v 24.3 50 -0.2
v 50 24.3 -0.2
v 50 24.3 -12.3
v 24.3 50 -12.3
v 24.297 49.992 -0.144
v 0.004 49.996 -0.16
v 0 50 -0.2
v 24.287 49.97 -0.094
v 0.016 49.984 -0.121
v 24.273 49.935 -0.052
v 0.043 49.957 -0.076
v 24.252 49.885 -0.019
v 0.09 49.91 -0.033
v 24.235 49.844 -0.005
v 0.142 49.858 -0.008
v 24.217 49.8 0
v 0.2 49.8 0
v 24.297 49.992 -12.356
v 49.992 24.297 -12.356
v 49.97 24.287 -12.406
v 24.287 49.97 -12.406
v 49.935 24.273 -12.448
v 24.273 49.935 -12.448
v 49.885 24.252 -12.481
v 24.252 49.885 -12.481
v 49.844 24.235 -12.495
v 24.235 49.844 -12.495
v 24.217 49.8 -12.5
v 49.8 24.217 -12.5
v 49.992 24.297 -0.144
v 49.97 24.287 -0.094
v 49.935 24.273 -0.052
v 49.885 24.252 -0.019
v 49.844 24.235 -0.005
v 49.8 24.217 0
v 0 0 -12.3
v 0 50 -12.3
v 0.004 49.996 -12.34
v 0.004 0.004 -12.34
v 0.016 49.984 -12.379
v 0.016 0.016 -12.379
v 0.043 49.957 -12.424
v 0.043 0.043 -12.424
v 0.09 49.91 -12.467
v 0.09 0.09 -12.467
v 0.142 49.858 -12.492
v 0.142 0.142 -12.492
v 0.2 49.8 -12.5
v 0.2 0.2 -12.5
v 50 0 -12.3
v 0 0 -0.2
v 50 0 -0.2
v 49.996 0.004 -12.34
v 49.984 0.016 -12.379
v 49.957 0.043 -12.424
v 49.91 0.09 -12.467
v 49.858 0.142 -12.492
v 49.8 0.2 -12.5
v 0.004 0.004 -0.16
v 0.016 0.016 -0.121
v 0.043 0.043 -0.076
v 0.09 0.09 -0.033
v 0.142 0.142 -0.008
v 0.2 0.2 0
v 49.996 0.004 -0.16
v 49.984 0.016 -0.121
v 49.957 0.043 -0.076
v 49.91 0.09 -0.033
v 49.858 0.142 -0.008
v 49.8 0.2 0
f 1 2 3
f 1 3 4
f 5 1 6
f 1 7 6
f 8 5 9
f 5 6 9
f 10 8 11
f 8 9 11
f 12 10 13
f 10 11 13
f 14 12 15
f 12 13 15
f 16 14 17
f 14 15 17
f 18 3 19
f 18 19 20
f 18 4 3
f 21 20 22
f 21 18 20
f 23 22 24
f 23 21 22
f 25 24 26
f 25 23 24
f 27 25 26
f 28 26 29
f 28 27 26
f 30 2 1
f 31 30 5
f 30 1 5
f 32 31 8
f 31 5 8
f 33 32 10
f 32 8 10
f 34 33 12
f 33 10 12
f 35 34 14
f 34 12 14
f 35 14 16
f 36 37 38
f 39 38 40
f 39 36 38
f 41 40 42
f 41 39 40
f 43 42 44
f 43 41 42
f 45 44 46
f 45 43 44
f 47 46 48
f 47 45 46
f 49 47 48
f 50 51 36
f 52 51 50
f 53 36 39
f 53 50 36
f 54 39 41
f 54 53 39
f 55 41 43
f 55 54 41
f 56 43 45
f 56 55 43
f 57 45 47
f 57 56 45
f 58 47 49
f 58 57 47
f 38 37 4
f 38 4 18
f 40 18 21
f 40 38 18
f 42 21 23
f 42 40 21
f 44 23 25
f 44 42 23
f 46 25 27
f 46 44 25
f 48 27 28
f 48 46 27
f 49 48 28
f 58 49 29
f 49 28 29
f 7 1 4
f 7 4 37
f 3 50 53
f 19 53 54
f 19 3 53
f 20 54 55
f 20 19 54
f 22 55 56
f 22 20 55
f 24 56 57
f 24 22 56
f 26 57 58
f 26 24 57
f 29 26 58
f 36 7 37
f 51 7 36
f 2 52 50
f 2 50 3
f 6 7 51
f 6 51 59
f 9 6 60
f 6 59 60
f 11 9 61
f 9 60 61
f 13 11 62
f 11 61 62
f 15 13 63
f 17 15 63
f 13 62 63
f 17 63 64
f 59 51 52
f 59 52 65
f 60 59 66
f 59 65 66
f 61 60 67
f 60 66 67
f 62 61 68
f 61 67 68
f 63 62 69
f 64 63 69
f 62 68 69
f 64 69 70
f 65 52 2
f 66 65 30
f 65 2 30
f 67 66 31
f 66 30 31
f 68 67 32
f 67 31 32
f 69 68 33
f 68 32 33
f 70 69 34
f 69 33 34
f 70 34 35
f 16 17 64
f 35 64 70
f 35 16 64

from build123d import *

# Parameters (mm, degrees)
F1_DEPTH = 12.5
F2_R     = 0.2


with BuildPart() as f1:
    # F0 (on Top) → F1 (new body)
    with BuildSketch(Plane.XY):
        Polygon((0, 50), (0, 0), (50, 0), (50, 24.3), (24.3, 50), align=None)
    extrude(amount=-F1_DEPTH)

    # F2
    f2_edges = [f1.edges().sort_by_distance(p)[0] for p in [
        (12.15, 50, 0),
        (0, 25, 0),
        (25, 0, 0),
        (50, 12.15, 0),
        (37.15, 37.15, 0),
        (12.15, 50, -12.5),
        (0, 25, -12.5),
        (25, 0, -12.5),
        (50, 12.15, -12.5),
        (37.15, 37.15, -12.5),
    ]]
    fillet(f2_edges, radius=F2_R)


solid = f1.part
